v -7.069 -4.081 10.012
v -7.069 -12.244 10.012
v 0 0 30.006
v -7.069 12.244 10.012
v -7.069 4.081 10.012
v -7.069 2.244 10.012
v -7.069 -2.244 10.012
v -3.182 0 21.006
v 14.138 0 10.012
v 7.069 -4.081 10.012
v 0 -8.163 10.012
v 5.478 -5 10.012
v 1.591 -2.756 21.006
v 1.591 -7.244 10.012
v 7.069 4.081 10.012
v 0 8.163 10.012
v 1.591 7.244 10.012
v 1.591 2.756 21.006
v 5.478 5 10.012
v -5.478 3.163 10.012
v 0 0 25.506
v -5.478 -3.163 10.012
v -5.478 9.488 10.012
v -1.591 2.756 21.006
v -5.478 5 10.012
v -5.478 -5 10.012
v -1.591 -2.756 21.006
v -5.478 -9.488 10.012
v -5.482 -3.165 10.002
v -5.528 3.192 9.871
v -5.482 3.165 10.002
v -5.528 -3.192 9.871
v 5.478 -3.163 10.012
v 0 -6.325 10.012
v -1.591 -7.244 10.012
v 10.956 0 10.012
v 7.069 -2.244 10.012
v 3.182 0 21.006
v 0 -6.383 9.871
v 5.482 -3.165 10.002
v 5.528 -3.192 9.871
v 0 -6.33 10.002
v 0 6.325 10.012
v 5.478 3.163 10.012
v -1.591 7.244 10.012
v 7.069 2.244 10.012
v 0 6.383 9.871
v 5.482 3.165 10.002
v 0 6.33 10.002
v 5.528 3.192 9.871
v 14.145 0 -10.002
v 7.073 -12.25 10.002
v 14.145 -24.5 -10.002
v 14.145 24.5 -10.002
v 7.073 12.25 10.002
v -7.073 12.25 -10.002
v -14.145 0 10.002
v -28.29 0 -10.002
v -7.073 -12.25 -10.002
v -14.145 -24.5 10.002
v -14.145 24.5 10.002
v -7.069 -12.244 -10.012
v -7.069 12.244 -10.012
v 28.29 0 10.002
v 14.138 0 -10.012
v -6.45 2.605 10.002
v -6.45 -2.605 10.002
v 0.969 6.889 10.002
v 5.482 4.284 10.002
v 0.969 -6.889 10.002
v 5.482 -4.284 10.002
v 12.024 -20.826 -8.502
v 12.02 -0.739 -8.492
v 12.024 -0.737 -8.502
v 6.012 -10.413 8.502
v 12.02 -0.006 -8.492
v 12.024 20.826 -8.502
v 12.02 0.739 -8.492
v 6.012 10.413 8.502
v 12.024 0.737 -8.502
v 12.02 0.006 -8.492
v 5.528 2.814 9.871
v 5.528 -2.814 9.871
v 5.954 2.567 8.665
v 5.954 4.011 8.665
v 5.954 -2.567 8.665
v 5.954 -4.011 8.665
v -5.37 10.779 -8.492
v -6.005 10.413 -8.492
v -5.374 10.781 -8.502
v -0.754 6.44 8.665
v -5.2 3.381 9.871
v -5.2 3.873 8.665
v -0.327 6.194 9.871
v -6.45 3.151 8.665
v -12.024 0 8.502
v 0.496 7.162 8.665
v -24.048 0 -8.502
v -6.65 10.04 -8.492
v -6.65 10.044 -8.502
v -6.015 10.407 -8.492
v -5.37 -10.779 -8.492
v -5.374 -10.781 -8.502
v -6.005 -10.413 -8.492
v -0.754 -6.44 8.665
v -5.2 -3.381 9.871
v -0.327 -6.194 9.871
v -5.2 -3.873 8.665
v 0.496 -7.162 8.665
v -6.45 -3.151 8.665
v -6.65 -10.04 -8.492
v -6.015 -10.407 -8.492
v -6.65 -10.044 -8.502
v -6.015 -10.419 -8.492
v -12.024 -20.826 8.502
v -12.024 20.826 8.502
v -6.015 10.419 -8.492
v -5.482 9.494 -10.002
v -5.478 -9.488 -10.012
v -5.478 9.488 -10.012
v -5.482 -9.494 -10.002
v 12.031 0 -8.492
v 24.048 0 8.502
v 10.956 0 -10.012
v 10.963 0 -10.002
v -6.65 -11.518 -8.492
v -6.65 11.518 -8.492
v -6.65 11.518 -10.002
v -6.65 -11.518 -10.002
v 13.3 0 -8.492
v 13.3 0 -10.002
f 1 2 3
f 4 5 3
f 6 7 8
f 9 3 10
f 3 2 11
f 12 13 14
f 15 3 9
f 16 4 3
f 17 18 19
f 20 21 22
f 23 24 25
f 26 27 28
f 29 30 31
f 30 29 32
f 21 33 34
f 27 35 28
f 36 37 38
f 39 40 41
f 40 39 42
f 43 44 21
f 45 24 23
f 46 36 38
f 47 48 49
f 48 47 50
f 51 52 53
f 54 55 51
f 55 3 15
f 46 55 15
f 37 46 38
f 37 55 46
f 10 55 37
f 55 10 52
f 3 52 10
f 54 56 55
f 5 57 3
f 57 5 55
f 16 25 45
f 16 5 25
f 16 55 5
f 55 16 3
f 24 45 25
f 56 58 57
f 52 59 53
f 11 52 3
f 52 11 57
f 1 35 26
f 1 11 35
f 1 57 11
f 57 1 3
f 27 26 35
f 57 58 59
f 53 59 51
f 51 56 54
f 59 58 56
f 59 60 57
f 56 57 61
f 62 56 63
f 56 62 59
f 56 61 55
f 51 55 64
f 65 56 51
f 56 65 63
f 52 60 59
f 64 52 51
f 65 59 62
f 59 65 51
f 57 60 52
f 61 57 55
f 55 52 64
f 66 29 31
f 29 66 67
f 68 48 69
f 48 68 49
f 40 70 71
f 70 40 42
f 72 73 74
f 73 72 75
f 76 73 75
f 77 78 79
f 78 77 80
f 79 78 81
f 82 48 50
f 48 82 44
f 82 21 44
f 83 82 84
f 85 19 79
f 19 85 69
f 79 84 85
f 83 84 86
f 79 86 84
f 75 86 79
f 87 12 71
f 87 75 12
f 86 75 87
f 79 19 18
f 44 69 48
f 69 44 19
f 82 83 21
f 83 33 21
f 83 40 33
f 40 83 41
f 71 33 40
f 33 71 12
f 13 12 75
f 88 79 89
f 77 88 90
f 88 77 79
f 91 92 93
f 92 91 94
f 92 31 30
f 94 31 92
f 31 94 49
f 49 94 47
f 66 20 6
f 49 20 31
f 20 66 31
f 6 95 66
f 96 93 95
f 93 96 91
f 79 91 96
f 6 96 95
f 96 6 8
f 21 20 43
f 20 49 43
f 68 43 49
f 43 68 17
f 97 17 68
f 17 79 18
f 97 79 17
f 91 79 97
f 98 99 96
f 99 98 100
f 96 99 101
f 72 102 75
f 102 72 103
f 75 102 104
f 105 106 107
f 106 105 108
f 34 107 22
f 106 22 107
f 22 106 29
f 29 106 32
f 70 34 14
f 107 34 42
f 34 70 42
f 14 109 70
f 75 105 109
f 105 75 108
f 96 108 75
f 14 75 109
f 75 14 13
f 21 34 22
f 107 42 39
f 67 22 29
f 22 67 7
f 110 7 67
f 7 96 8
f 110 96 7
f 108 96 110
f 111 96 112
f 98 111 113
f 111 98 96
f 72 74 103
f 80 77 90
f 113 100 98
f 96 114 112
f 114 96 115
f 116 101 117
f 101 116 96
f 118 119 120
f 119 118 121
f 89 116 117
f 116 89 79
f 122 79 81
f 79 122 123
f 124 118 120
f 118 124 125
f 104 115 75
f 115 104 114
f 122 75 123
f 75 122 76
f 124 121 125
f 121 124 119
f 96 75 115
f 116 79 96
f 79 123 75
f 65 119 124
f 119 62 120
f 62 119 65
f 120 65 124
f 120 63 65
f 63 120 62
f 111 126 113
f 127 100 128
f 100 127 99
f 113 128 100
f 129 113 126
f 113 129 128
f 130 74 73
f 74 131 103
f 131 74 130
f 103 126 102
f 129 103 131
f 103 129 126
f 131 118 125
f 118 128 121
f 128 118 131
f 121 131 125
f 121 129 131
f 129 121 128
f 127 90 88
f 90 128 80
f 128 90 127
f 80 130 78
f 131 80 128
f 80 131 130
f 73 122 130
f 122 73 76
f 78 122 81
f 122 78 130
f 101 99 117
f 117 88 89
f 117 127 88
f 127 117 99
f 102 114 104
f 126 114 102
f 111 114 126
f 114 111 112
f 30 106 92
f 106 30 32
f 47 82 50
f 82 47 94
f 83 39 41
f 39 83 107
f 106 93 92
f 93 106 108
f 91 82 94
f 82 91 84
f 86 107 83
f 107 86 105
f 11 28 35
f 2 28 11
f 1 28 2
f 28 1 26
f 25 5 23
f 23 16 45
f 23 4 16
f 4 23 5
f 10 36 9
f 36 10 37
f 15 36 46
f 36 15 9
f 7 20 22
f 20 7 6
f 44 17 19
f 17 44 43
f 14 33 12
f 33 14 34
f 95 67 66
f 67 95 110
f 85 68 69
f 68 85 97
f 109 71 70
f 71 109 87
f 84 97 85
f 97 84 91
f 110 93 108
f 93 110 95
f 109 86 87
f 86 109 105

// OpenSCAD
arete = 49;
paroi = 1.5;
echelleReductionAjustementBouchon = 0.97;
r = 0.19; // résolution d'impression sur l'axe Z
tetra_sch = [3,3];
Cpi = 3.14159;
Cphi = (1+sqrt(5))/2;
Cepsilon = 0.00000001;

function tetra_ext_radius(a) = 
    a/4*sqrt(6);
    
function tetra_int_radius(a) = 
    a/12*sqrt(6);
    
function tetra_arete_from(radius) = 
    radius*12/sqrt(6);
    
externalRadius = tetra_ext_radius(arete);
internalRadius = tetra_ext_radius( 
                    tetra_arete_from(
                        tetra_int_radius(arete)-paroi));
                        
echo(externalRadius); 
echo(internalRadius);

//merkaba(arete);
//poly_creux();
//decoupe_bouchon();
corps_ouvert();
bouchon();
//trou();

module corps_ouvert() {
    rotate([180, 0, 0])
	render(convexity = 2) difference() {
		poly_creux();
		decoupe_bouchon();
	}
}

module bouchon() {
//	scale([echelleReductionAjustementBouchon, echelleReductionAjustementBouchon, 0.995])
	render(convexity = 2) difference () {
        intersection() {
            union() {
                poly_creux();
                supplement_feuillure_bouchon(echelleReductionAjustementBouchon);
            }
            decoupe_bouchon(echelleReductionAjustementBouchon);
        }
	}
}

module poly_creux() {
	difference() {
        merkaba(externalRadius);
        merkaba(internalRadius);
	}
}

module decoupe_bouchon(scale=1) {
    distance = tetra_int_radius(arete);
	rotate([0,0,0]) translate([0,0,distance+0.01])
		cylinder(999, r=arete*0.2988, $fn=3);
	rotate([0,0,0]) translate([0,0,distance-(paroi+0.01)*pow(scale,4)])
		cylinder((paroi+0.01)*pow(scale,4), r=(arete-paroi)*0.28*scale, $fn=3, center=false);
}

module supplement_feuillure_bouchon(scale=1) {
    distance = tetra_int_radius(arete);
    radius = (arete-paroi)*scale*0.28;
    rotate([0,0,0]) translate([0,0, distance-paroi])
    difference() {   
		cylinder(paroi*pow(scale,3), r=radius, $fn=3, center=false);
		cylinder(paroi*pow(scale,3), r=radius-2.5, $fn=3, center=false);
    }
}

module merkaba(rad) {
    union() {
        tetrahedron(rad);
        rotate([0,180,0]) tetrahedron(rad);
    }
}

module tetrahedron(rad) {
    // create an instance of a spherical coordinate
    // long - rotation around z -axis
    // lat - latitude, starting at 0 == 'north pole'
    // rad - distance from center
    function sph(long, lat, rad=1) = [long, lat, rad];
    
    // Convert spherical to cartesian
    function sph_to_cart(s) = [
	clean(s[2]*sin(s[1])*cos(s[0])),  

	clean(s[2]*sin(s[1])*sin(s[0])),

	clean(s[2]*cos(s[1]))
	];

    function sphu_from_cart(c, rad=1) = sph(
        atan2(c[1],c[0]), 
        atan2(sqrt(c[0]*c[0]+c[1]*c[1]), c[2]), 
        rad
        );

    tetra_cart = [
        [+1, +1, +1],
        [-1, -1, +1],
        [-1, +1, -1],
        [+1, -1, -1]
    ];

    function tetra_unit(rad=1) = [
        sph_to_cart(sphu_from_cart(tetra_cart[0], rad)), 
        sph_to_cart(sphu_from_cart(tetra_cart[1], rad)),
        sph_to_cart(sphu_from_cart(tetra_cart[2], rad)),
        sph_to_cart(sphu_from_cart(tetra_cart[3], rad)),
        ];


    tetrafaces = [
        [0, 3, 1],
        [0,1,2],
        [2,1,3],
        [0,2,3]
    ];

    tetra_edges = [
        [0,1],
        [0,2],
        [0,3], 
        [1,2], 
        [1,3], 
        [2,3],	
        ];

    rotate([0, (180-acos(1/3))/2, 0])
    rotate([0, 0, 45])
//    rotate(a=(180-acos(1/3))/2, v=[1,1,0])
    polyhedron(tetra_unit(rad), faces=tetrafaces);
}
//translate([0, 0, -17.7])
//cylinder(5,40,40);

function clean(n) = (n < 0) ? ((n < -Cepsilon) ? n : 0) : 
	(n < Cepsilon) ? 0 : n; 

function plat_dihedral(pq) = 2 * asin( cos(180/pq[1])/sin(180/pq[0]));

function plat_circumradius(pq, a) = 
	(a/2)*
	tan(Cpi/pq[1])*
	tan(plat_dihedral(pq)/2);

function plat_midradius(pq, a) = 
	(a/2)*
	cos(Cpi/pq[0])*
	tan(plat_dihedral(pq)/2);

function plat_inradius(pq,a) = 
	a/(2*tan(Cpi/pq[0]))*
	sqrt((1-cos(plat_dihedral(pq)))/(1+cos(plat_dihedral(pq))));

function plat_a_from_inradius(pq, inradius) =
    inradius*(2*tan(Cpi/pq[0]))/
	sqrt((1-cos(plat_dihedral(pq)))/(1+cos(plat_dihedral(pq))));
